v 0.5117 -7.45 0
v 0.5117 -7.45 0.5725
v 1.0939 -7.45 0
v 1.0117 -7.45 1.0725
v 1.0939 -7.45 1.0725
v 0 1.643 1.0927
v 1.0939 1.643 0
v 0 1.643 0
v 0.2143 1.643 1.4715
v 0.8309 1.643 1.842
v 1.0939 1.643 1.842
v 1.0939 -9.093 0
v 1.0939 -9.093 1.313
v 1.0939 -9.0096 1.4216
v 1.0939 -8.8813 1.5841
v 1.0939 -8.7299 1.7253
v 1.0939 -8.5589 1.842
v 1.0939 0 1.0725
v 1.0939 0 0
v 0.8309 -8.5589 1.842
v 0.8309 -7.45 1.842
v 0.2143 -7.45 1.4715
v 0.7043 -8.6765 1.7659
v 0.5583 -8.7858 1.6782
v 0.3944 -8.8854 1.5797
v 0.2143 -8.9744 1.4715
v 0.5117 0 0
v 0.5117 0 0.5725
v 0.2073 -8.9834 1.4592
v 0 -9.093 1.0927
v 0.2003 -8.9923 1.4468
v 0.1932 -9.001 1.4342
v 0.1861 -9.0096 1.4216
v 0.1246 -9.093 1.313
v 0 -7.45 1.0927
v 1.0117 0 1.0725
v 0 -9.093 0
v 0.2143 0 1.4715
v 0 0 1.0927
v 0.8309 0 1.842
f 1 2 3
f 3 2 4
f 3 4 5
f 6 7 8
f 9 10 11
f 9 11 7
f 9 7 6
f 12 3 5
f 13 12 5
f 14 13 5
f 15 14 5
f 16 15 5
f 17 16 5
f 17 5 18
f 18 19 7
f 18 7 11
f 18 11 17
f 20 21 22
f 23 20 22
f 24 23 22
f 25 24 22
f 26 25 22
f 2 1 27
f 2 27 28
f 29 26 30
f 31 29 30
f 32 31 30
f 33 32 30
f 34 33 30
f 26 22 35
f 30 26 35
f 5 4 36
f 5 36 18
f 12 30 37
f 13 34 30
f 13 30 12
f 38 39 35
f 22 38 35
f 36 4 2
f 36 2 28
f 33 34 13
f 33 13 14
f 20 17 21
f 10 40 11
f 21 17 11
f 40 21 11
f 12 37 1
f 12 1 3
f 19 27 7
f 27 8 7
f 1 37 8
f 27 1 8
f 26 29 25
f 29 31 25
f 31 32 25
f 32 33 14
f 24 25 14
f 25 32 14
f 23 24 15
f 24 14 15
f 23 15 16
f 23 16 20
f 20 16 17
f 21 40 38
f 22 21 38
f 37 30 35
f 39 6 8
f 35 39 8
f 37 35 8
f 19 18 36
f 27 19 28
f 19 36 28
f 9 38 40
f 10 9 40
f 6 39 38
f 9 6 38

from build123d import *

# Parameters (mm, degrees)
F1_DEPTH  = 7.45
F2_W      = 0.582146
F2_H      = 1.072485
F3_DEPTH  = 7.451
F4_SIZE   = 0.5
F5_SIZE   = 0.25
F7_DEPTH  = 1.643
F9_DEPTH  = 1.643
F11_W     = 10.736
F11_H     = 0.158
F12_DEPTH = 1.094878
F13_DEPTH = 1.094878


with BuildPart() as f1:
    # F0 (on Front) → F1 (new body)
    with BuildSketch(Plane.XZ):
        Polygon((0, 1.342732), (0, 0), (1.093878, 0), (1.093878, 1.085751), (1.093878, 2), align=None)
    extrude(amount=F1_DEPTH)

    # F2 (on face) → F3 (cut, through all)
    with BuildSketch(Plane.XZ.offset(7.45)):
        with Locations((0.802805, 0.536242)):
            Rectangle(F2_W, F2_H)
    extrude(amount=-F3_DEPTH, mode=Mode.SUBTRACT)

    # F4
    f4_edges = [f1.edges().sort_by_distance(p)[0] for p in [
        (0.511732, -3.725, 1.072485),
    ]]
    chamfer(f4_edges, length=F4_SIZE)

    # F5
    f5_edges = [f1.edges().sort_by_distance(p)[0] for p in [
        (0, -3.725, 1.342732),
    ]]
    chamfer(f5_edges, length=F5_SIZE)

    # F6 (on face) → F7 (join)
    with BuildSketch(Plane(origin=(0, 0, 0), x_dir=(-1, 0, 0), z_dir=(0, 1, 0))):
        Polygon((-0.214292, 1.471492), (-1.093878, 2), (-1.093878, 0), (0, 0), (0, 1.092732), align=None)
    extrude(amount=F7_DEPTH)

    # F8 (on face) → F9 (join)
    with BuildSketch(Plane.XZ.offset(7.45)):
        Polygon((1.093878, 0), (1.093878, 2), (0.214292, 1.471492), (0, 1.092732), (0, 0), align=None)
    extrude(amount=F9_DEPTH)

    # F11 (on face) → F12 (cut, through all)
    with BuildSketch(Plane.YZ.offset(1.093878)):
        with Locations((-3.725, 1.921)):
            Rectangle(F11_W, F11_H)
    extrude(amount=-F12_DEPTH, mode=Mode.SUBTRACT)

    # F10 (on face) → F13 (cut, through all)
    with BuildSketch(Plane.YZ.offset(1.093878)):
        with BuildLine():
            Line((-9.093, 2), (-9.093, 1.31302))
            Line((-9.093, 1.31302), (-9.009582, 1.421623))
            ThreePointArc((-9.009582, 1.421623), (-8.629245, 1.79858), (-8.133078, 2))
            Line((-8.133078, 2), (-9.093, 2))
        make_face()
        with BuildLine():
            ThreePointArc((-7.6235, 2), (-7.878289, 2.024017), (-8.133078, 2))
            Line((-8.133078, 2), (-7.6235, 2))
        make_face()
    extrude(amount=-F13_DEPTH, mode=Mode.SUBTRACT)


solid = f1.part
